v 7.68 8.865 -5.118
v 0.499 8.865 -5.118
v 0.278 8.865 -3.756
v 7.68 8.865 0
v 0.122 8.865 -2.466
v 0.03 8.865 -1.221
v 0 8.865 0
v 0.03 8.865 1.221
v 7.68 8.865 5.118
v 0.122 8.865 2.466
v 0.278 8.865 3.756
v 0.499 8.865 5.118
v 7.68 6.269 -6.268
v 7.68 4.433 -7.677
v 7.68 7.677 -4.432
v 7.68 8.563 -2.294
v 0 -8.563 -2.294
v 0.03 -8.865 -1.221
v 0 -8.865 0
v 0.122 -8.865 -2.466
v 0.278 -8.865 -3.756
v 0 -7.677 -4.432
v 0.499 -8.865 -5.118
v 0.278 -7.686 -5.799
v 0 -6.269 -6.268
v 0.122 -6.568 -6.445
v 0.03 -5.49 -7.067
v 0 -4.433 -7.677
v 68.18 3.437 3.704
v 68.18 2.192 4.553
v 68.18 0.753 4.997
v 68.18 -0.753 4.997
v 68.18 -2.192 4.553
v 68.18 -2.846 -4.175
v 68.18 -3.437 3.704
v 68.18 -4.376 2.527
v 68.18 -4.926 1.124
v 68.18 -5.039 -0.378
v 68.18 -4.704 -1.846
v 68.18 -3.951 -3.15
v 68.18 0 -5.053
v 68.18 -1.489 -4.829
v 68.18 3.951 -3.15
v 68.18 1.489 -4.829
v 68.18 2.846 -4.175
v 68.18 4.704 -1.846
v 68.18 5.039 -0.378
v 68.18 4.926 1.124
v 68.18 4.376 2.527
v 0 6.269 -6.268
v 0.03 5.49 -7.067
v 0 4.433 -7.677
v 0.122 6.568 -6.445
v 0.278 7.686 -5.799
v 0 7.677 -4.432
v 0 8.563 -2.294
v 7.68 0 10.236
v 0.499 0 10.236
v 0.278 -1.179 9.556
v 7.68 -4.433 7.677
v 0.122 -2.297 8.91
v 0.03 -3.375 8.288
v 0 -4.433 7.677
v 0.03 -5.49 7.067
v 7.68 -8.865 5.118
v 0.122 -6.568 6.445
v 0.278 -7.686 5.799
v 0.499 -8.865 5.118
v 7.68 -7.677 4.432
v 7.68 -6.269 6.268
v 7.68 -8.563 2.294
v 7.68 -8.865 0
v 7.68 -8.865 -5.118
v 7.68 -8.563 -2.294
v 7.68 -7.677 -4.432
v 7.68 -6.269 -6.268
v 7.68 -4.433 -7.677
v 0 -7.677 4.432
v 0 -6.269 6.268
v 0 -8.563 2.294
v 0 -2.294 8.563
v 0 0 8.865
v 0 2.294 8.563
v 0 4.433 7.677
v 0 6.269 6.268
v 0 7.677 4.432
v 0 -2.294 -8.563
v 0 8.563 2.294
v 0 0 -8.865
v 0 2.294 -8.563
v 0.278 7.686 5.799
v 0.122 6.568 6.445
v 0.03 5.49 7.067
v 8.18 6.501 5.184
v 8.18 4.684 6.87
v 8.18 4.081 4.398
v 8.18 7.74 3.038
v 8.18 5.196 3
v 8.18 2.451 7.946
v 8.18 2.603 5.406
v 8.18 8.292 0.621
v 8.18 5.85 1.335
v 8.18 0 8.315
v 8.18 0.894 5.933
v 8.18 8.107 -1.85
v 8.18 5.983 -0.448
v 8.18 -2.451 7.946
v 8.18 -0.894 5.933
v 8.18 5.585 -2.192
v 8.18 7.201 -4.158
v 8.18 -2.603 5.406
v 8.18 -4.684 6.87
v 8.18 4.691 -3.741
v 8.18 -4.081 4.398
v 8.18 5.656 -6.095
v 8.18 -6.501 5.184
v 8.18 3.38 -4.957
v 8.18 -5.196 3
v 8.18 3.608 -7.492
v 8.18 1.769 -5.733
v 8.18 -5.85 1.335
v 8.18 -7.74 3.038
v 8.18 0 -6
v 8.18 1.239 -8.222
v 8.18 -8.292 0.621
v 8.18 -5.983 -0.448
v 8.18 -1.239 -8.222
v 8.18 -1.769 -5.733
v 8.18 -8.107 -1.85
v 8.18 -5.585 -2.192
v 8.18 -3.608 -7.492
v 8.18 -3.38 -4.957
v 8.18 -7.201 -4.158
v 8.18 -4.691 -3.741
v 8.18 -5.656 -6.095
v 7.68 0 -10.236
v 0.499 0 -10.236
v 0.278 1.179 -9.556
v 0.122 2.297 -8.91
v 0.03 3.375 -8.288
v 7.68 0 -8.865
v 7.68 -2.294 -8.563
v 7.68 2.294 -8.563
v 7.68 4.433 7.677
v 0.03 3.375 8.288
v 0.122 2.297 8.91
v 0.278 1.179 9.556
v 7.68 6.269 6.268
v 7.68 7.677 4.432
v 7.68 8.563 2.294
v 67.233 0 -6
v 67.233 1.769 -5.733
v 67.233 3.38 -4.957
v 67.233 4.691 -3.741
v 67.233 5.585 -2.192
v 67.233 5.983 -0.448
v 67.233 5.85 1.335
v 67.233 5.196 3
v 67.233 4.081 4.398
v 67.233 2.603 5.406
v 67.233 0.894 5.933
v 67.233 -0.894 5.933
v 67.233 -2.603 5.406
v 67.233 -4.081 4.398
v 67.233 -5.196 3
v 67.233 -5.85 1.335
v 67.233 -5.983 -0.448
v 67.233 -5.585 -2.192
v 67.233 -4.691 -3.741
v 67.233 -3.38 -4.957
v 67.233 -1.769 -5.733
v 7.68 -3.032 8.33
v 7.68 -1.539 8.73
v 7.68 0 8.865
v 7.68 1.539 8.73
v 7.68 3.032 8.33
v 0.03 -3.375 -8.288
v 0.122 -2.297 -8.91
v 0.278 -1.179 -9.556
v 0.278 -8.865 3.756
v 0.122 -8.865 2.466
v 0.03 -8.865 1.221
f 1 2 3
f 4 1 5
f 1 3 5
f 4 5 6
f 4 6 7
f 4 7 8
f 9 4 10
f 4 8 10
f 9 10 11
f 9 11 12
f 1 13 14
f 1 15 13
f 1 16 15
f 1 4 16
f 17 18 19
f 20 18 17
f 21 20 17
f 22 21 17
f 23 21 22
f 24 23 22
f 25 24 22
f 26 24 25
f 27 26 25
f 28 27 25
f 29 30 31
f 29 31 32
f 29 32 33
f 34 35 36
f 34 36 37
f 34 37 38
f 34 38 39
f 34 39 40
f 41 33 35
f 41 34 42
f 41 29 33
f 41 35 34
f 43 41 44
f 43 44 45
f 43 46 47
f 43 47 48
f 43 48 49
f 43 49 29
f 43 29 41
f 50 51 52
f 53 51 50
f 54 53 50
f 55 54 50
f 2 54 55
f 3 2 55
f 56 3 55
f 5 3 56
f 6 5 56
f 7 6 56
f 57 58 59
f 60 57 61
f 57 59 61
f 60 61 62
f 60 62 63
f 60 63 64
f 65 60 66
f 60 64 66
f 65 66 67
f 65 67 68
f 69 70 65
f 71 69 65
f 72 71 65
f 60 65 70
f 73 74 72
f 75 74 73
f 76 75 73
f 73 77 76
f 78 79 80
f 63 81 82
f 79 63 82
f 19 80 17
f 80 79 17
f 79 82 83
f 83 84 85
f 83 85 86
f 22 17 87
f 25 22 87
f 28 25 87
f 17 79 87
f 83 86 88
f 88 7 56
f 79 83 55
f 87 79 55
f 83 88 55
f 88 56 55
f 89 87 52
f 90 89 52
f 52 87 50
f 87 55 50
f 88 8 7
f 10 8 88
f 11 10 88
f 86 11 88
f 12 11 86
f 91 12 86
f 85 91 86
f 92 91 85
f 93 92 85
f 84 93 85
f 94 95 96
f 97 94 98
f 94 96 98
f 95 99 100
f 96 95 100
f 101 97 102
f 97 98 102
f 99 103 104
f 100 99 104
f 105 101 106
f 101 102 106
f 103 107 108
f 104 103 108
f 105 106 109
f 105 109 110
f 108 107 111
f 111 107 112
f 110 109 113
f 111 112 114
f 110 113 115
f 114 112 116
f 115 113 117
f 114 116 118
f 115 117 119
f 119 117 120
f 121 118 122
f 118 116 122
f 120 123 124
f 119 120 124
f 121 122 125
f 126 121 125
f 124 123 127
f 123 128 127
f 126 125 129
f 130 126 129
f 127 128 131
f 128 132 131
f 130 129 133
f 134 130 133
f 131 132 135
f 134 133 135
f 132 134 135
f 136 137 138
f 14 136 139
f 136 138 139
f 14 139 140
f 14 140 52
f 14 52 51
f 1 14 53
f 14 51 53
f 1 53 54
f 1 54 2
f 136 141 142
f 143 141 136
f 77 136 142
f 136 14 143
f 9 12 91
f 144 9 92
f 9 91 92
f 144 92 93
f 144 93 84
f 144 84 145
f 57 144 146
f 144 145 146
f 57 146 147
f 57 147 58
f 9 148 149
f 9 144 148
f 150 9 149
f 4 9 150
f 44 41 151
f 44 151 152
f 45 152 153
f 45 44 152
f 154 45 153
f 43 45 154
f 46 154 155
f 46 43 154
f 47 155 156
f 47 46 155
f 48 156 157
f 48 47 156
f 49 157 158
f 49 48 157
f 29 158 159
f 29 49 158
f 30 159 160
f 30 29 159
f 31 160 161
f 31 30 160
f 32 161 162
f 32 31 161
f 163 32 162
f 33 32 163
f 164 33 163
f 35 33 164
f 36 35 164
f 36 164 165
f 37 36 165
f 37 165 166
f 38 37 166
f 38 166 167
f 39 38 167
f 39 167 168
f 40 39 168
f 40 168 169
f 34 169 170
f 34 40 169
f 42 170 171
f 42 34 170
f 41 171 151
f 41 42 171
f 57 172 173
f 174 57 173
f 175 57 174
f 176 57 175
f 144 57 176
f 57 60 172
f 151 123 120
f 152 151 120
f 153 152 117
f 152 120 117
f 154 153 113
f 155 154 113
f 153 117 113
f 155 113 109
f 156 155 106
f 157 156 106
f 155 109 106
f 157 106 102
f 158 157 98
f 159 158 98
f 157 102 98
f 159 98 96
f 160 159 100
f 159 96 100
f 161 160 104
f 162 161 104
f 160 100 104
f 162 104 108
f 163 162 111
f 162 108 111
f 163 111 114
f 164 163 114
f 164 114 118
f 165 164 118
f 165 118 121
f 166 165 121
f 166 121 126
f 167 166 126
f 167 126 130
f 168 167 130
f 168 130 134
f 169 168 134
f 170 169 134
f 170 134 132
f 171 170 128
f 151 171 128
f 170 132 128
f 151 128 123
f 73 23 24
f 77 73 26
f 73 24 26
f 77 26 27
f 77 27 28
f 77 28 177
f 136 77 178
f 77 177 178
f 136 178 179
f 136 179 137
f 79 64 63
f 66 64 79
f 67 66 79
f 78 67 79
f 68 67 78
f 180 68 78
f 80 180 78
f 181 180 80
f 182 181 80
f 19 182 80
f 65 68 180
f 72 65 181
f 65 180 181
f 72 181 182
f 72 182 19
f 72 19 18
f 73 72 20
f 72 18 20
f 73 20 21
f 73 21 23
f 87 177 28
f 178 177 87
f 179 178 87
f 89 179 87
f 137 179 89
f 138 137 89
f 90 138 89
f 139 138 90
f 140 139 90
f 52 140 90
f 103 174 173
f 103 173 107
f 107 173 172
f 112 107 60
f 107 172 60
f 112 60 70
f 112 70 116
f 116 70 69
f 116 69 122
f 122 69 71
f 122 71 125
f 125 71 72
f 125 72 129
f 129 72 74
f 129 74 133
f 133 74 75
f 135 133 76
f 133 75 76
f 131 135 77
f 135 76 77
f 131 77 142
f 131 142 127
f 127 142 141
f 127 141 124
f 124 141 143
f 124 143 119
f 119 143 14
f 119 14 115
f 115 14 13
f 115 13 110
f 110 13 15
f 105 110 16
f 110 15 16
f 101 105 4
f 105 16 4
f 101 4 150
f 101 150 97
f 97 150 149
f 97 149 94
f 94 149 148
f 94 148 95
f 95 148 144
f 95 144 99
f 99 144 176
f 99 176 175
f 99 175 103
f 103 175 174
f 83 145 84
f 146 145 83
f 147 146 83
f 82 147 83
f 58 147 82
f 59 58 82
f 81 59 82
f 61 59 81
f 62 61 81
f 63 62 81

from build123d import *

# Parameters (mm, degrees)
BASEHEAD_DEPTH = 7.68
SKETCH3_R      = 6
BASEBODY_DEPTH = 60
CHAMFER1_SIZE  = 0.947


with BuildPart() as part:
    # Sketch-BaseHead → BaseHead (new body)
    with BuildSketch(Plane(origin=(0, 0, 0), x_dir=(0, 0, -1), z_dir=(1, 0, 0))):
        Polygon((10.236420273, 0), (5.118210136, 8.865), (-5.118210136, 8.865), (-10.236420273, 0), (-5.118210136, -8.865), (5.118210136, -8.865), align=None)
    extrude(amount=BASEHEAD_DEPTH)

    # Sketch4 → HeadChamfer (revolve, cut)
    with BuildSketch(Plane(origin=(-0.264637255, 0, 5.916896391), x_dir=(0, 0, -1), z_dir=(0, 1, 0))):
        Polygon((16.153316664, -0.264637255), (14.781896391, -0.264637255), (16.153316664, -0.763793413), align=None)
    revolve(axis=Axis((-4.001564945, 0, 0), (1, 0, 0)), mode=Mode.SUBTRACT)

    # Sketch1 → Revolve1 (revolve)
    with BuildSketch(Plane.XY, mode=Mode.PRIVATE) as revolve1_sk:
        Polygon((7.68, 0), (8.18, 0), (8.18, -8.315), (7.68, -8.865), align=None)
    revolve(revolve1_sk.sketch.rotate(Axis((-4.001564945, 0, 0), (1, 0, 0)), 270), axis=Axis((-4.001564945, 0, 0), (1, 0, 0)))

    # Sketch3 → BaseBody (add)
    with BuildSketch(Plane(origin=(8.18, 0, 0), x_dir=(0, 0, -1), z_dir=(1, 0, 0))):
        Circle(SKETCH3_R)
    extrude(amount=BASEBODY_DEPTH)

    # Chamfer1
    chamfer1_edges = [part.edges().sort_by_distance(p)[0] for p in [
        (68.18, 0, 6),
    ]]
    chamfer(chamfer1_edges, length=CHAMFER1_SIZE)


solid = part.part
